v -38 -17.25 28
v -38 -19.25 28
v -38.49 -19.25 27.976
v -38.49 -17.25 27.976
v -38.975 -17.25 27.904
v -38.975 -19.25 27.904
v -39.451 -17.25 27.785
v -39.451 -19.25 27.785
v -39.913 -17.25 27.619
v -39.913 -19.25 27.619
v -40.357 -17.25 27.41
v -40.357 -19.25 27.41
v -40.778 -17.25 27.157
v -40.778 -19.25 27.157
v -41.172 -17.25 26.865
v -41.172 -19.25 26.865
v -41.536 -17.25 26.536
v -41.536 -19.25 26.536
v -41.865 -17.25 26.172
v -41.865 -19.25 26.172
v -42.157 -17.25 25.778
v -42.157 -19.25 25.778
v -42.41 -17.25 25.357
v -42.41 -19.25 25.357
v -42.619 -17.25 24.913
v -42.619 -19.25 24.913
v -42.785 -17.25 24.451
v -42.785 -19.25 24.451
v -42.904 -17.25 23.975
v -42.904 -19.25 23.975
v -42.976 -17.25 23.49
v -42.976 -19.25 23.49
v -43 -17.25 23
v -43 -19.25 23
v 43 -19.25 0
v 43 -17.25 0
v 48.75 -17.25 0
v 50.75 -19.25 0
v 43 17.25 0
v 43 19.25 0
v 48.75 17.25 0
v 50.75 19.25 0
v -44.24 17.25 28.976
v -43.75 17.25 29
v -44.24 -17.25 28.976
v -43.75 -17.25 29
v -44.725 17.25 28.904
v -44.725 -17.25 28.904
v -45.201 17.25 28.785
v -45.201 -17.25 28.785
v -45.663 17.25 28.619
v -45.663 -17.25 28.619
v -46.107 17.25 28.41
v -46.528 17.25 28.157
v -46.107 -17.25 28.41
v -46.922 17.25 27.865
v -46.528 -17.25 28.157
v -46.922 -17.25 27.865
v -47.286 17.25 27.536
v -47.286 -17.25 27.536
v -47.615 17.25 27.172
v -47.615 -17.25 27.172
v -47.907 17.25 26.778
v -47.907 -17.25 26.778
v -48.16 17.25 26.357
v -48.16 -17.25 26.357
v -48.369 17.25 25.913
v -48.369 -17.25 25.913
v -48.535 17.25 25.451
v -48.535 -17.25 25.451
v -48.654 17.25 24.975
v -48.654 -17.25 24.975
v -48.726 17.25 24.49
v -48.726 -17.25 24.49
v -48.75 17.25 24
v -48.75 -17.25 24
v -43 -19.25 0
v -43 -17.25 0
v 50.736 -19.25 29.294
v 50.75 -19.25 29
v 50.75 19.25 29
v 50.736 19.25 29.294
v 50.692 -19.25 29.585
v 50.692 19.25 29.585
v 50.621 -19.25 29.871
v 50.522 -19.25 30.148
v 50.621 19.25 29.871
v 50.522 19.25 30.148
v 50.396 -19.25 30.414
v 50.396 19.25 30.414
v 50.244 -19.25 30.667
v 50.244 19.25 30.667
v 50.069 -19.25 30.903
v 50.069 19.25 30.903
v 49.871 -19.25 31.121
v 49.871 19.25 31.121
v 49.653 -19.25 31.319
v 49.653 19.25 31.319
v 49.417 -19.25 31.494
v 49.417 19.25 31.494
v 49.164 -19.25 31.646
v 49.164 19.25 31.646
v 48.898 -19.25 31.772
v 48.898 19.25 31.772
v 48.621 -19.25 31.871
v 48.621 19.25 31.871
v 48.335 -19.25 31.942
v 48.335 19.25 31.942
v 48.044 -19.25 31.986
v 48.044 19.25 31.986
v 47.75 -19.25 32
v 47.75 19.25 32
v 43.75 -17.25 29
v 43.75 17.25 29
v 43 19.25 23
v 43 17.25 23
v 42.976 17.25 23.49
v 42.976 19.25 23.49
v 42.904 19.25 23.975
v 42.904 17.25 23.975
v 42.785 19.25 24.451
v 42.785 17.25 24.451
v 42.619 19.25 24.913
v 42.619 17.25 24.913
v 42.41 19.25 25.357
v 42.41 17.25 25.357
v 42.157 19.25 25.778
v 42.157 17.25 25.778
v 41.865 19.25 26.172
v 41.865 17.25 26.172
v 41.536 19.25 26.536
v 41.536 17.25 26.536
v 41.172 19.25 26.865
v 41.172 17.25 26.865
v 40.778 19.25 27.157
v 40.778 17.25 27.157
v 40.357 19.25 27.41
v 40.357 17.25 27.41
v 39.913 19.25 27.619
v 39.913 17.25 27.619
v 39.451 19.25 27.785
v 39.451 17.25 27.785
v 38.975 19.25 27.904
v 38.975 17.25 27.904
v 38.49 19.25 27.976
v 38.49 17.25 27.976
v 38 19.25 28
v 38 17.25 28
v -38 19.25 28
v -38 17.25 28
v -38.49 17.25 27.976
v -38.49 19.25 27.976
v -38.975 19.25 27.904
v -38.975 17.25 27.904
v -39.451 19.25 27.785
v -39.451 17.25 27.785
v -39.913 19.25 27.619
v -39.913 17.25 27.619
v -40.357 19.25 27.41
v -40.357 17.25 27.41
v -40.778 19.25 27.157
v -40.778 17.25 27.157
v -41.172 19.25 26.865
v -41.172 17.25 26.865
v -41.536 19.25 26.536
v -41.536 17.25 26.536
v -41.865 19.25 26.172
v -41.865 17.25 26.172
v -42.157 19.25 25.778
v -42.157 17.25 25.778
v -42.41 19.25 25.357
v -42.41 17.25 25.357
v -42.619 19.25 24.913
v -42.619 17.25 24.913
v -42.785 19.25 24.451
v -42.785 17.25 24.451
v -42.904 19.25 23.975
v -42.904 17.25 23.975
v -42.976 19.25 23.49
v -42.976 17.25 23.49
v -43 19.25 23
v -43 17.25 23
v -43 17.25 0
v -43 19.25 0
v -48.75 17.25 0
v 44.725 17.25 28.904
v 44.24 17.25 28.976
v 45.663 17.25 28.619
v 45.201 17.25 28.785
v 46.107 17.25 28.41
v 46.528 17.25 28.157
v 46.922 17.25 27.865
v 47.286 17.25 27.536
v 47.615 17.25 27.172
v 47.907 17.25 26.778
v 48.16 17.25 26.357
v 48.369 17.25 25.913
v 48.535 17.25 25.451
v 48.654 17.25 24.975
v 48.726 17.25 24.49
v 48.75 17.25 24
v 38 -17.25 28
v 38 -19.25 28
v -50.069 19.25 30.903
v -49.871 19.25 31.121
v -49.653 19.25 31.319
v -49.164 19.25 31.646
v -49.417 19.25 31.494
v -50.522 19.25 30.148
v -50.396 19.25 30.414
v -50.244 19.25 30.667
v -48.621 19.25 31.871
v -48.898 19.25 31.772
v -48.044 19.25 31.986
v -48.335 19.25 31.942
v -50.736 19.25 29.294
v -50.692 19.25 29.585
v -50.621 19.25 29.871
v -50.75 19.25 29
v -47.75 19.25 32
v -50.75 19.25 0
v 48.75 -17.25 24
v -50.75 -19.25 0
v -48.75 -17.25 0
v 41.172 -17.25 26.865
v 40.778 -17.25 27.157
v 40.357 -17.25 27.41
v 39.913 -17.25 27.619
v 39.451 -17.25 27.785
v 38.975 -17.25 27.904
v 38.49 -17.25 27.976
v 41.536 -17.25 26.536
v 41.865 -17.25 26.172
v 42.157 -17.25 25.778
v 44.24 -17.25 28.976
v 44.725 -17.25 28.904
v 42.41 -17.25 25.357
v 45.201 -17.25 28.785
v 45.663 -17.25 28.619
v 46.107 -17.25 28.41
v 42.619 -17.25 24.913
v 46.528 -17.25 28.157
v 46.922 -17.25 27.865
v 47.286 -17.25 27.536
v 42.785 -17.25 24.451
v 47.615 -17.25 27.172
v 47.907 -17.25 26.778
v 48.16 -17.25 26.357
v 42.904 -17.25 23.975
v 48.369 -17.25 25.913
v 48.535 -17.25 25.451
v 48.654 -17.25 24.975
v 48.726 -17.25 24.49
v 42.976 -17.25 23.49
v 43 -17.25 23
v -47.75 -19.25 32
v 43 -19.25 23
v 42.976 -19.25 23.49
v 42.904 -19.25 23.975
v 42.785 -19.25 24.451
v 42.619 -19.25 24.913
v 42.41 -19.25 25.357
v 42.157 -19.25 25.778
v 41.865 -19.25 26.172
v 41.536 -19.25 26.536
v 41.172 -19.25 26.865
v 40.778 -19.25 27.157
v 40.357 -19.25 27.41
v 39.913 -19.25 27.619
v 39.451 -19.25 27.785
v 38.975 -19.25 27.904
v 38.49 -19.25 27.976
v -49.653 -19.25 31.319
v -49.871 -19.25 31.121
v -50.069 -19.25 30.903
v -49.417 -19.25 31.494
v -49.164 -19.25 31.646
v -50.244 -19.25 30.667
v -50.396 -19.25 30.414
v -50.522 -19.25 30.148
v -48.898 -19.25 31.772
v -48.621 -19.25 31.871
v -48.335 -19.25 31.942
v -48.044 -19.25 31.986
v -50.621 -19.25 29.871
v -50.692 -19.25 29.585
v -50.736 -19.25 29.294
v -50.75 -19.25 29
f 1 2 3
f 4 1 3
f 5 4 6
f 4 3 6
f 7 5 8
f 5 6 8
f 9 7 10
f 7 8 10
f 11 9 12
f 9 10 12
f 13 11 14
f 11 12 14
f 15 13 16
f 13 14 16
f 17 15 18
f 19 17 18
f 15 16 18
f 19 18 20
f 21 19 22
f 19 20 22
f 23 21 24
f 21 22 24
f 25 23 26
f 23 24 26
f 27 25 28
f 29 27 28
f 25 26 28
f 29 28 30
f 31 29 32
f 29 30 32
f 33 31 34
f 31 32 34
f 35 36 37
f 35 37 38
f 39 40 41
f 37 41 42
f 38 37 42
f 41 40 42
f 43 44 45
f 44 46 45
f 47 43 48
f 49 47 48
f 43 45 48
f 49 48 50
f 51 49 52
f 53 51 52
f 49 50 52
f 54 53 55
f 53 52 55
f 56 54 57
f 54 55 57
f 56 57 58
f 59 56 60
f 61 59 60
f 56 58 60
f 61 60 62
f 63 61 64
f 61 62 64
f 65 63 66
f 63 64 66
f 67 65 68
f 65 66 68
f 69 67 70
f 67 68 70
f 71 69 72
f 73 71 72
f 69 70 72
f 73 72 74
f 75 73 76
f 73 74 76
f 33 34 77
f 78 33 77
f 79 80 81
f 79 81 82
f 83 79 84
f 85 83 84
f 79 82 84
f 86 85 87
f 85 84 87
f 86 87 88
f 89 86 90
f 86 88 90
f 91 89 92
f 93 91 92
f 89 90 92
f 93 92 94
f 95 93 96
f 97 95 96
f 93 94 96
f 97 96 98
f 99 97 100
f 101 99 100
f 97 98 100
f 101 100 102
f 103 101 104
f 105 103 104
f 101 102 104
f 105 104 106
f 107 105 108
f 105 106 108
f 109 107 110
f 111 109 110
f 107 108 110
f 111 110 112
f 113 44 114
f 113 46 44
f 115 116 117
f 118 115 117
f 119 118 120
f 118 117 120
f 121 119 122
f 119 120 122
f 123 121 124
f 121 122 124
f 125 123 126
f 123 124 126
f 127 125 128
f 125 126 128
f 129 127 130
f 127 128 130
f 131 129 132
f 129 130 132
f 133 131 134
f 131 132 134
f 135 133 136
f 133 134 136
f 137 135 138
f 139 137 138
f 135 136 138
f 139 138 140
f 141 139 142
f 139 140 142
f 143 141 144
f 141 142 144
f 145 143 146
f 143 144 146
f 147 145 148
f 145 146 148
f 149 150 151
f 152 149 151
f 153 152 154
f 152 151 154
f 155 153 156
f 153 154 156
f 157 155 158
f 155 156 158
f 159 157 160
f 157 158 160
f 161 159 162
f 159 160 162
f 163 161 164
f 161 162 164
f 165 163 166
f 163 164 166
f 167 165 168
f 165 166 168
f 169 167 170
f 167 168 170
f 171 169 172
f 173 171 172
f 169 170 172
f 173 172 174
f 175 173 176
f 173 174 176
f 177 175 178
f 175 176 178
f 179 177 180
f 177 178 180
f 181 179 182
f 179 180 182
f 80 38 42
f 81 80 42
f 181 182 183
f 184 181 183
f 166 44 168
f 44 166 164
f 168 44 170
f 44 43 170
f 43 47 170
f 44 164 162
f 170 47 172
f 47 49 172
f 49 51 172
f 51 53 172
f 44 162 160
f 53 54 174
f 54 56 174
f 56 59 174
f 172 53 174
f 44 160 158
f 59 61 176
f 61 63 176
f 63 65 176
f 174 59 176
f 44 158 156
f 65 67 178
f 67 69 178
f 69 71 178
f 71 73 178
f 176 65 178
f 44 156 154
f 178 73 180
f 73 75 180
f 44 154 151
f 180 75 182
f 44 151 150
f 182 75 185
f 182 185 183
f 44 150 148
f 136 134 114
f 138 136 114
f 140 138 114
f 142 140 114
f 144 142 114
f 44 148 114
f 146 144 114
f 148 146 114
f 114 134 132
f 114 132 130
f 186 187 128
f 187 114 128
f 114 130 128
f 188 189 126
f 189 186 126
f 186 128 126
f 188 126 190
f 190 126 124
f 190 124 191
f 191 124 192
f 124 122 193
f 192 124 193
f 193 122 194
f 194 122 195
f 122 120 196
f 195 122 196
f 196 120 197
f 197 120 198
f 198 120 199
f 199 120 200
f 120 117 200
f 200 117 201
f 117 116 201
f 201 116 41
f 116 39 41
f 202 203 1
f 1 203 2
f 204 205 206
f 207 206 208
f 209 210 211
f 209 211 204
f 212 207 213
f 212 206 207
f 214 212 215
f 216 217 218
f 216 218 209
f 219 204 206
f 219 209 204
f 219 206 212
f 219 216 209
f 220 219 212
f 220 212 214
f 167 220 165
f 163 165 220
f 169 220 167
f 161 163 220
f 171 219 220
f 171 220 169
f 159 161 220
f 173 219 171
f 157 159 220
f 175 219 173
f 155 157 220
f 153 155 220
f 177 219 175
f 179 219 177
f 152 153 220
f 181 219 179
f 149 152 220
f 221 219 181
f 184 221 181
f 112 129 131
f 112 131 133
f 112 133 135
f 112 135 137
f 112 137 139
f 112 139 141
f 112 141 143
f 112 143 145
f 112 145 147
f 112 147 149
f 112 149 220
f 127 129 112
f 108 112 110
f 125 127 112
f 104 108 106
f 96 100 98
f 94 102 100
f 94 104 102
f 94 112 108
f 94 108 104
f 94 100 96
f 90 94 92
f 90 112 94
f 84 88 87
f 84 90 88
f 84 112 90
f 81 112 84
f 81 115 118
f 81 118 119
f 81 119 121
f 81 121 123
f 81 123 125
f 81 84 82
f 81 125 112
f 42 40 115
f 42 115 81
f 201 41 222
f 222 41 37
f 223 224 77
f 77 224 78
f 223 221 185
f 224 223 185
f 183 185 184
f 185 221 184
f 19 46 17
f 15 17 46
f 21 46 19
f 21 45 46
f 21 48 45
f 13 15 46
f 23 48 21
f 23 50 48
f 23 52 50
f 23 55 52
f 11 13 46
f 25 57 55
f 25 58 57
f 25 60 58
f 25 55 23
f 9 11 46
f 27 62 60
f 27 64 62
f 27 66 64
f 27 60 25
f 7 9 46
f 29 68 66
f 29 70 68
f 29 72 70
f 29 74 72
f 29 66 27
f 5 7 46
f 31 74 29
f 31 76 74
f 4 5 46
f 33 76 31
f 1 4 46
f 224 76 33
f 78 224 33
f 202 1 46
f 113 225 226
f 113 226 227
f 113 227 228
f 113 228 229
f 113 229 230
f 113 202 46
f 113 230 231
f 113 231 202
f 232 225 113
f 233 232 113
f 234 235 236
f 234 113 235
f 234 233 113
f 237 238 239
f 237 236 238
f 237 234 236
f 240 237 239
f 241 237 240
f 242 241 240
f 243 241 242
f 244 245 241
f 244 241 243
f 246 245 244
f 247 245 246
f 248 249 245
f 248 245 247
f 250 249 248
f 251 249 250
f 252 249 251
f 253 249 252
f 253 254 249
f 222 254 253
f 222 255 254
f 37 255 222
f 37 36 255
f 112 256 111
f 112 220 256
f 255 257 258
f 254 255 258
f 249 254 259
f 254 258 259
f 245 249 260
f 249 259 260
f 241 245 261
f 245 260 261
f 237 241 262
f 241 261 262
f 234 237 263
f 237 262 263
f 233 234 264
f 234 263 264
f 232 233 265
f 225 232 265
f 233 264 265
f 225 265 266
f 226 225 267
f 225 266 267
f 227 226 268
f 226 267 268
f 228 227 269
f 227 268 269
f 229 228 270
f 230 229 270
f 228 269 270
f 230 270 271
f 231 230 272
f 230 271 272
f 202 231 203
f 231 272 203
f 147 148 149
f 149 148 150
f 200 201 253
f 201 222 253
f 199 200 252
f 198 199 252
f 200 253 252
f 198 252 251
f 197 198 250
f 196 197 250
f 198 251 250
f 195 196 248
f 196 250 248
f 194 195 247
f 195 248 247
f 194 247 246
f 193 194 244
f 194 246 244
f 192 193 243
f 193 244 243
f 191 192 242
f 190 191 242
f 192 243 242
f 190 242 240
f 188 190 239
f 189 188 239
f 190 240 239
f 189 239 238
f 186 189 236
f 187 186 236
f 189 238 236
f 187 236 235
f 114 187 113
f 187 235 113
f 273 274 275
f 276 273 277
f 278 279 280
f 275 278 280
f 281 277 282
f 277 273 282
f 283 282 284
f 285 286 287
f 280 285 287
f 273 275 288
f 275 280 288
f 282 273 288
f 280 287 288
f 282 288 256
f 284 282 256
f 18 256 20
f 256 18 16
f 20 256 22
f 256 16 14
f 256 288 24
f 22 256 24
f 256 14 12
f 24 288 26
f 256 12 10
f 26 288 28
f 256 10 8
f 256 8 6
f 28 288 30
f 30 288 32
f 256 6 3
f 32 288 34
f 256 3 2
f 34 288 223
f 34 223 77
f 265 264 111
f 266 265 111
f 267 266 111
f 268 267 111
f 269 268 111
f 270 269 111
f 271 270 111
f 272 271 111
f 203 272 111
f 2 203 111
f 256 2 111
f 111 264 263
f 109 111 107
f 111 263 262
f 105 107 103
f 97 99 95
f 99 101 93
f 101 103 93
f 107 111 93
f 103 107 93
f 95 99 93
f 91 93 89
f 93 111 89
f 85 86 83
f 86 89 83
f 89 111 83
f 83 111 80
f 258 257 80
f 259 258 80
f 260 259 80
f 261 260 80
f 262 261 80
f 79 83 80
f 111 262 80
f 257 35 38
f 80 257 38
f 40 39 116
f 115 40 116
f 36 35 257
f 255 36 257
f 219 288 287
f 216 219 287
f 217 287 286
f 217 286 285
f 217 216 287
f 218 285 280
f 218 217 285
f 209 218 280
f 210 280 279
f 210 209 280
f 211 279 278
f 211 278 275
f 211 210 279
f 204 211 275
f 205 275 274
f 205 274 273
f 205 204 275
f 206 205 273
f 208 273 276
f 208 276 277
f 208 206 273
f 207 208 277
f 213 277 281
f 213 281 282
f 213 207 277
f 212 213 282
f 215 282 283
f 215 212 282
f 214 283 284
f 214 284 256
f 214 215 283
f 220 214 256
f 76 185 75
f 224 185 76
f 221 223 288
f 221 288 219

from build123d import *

# Parameters (mm, degrees)
F0_W     = 101.5
F0_H     = 38.5
F1_DEPTH = 32
F2_W     = 97.5
F2_H     = 34.5
F3_DEPTH = 29
F5_DEPTH = 38.501
F6_R     = 5
F7_R     = 5
F8_R     = 3


with BuildPart() as f1:
    # F0 (on Top) → F1 (new body)
    with BuildSketch(Plane.XY):
        Rectangle(F0_W, F0_H)
    extrude(amount=F1_DEPTH)

    # F2 (on face) → F3 (cut)
    with BuildSketch(Plane(origin=(0, 0, 0), x_dir=(1, 0, 0), z_dir=(0, 0, -1))):
        Rectangle(F2_W, F2_H)
    extrude(amount=-F3_DEPTH, mode=Mode.SUBTRACT)

    # F4 (on face) → F5 (cut, through all)
    with BuildSketch(Plane.XZ.offset(19.25)):
        with BuildLine():
            Line((-43, 23), (-43, 0))
            Line((-43, 0), (43, 0))
            Line((43, 0), (43, 23))
            ThreePointArc((43, 23), (41.535534, 26.535534), (38, 28))
            Line((38, 28), (-38, 28))
            ThreePointArc((-38, 28), (-41.535534, 26.535534), (-43, 23))
        make_face()
    extrude(amount=-F5_DEPTH, mode=Mode.SUBTRACT)

    # F6
    f6_edges = [f1.edges().sort_by_distance(p)[0] for p in [
        (48.75, 0, 29),
    ]]
    fillet(f6_edges, radius=F6_R)

    # F7
    f7_edges = [f1.edges().sort_by_distance(p)[0] for p in [
        (-48.75, 0, 29),
    ]]
    fillet(f7_edges, radius=F7_R)

    # F8
    f8_edges = [f1.edges().sort_by_distance(p)[0] for p in [
        (50.75, 0, 32),
        (-50.75, 0, 32),
    ]]
    fillet(f8_edges, radius=F8_R)


solid = f1.part
